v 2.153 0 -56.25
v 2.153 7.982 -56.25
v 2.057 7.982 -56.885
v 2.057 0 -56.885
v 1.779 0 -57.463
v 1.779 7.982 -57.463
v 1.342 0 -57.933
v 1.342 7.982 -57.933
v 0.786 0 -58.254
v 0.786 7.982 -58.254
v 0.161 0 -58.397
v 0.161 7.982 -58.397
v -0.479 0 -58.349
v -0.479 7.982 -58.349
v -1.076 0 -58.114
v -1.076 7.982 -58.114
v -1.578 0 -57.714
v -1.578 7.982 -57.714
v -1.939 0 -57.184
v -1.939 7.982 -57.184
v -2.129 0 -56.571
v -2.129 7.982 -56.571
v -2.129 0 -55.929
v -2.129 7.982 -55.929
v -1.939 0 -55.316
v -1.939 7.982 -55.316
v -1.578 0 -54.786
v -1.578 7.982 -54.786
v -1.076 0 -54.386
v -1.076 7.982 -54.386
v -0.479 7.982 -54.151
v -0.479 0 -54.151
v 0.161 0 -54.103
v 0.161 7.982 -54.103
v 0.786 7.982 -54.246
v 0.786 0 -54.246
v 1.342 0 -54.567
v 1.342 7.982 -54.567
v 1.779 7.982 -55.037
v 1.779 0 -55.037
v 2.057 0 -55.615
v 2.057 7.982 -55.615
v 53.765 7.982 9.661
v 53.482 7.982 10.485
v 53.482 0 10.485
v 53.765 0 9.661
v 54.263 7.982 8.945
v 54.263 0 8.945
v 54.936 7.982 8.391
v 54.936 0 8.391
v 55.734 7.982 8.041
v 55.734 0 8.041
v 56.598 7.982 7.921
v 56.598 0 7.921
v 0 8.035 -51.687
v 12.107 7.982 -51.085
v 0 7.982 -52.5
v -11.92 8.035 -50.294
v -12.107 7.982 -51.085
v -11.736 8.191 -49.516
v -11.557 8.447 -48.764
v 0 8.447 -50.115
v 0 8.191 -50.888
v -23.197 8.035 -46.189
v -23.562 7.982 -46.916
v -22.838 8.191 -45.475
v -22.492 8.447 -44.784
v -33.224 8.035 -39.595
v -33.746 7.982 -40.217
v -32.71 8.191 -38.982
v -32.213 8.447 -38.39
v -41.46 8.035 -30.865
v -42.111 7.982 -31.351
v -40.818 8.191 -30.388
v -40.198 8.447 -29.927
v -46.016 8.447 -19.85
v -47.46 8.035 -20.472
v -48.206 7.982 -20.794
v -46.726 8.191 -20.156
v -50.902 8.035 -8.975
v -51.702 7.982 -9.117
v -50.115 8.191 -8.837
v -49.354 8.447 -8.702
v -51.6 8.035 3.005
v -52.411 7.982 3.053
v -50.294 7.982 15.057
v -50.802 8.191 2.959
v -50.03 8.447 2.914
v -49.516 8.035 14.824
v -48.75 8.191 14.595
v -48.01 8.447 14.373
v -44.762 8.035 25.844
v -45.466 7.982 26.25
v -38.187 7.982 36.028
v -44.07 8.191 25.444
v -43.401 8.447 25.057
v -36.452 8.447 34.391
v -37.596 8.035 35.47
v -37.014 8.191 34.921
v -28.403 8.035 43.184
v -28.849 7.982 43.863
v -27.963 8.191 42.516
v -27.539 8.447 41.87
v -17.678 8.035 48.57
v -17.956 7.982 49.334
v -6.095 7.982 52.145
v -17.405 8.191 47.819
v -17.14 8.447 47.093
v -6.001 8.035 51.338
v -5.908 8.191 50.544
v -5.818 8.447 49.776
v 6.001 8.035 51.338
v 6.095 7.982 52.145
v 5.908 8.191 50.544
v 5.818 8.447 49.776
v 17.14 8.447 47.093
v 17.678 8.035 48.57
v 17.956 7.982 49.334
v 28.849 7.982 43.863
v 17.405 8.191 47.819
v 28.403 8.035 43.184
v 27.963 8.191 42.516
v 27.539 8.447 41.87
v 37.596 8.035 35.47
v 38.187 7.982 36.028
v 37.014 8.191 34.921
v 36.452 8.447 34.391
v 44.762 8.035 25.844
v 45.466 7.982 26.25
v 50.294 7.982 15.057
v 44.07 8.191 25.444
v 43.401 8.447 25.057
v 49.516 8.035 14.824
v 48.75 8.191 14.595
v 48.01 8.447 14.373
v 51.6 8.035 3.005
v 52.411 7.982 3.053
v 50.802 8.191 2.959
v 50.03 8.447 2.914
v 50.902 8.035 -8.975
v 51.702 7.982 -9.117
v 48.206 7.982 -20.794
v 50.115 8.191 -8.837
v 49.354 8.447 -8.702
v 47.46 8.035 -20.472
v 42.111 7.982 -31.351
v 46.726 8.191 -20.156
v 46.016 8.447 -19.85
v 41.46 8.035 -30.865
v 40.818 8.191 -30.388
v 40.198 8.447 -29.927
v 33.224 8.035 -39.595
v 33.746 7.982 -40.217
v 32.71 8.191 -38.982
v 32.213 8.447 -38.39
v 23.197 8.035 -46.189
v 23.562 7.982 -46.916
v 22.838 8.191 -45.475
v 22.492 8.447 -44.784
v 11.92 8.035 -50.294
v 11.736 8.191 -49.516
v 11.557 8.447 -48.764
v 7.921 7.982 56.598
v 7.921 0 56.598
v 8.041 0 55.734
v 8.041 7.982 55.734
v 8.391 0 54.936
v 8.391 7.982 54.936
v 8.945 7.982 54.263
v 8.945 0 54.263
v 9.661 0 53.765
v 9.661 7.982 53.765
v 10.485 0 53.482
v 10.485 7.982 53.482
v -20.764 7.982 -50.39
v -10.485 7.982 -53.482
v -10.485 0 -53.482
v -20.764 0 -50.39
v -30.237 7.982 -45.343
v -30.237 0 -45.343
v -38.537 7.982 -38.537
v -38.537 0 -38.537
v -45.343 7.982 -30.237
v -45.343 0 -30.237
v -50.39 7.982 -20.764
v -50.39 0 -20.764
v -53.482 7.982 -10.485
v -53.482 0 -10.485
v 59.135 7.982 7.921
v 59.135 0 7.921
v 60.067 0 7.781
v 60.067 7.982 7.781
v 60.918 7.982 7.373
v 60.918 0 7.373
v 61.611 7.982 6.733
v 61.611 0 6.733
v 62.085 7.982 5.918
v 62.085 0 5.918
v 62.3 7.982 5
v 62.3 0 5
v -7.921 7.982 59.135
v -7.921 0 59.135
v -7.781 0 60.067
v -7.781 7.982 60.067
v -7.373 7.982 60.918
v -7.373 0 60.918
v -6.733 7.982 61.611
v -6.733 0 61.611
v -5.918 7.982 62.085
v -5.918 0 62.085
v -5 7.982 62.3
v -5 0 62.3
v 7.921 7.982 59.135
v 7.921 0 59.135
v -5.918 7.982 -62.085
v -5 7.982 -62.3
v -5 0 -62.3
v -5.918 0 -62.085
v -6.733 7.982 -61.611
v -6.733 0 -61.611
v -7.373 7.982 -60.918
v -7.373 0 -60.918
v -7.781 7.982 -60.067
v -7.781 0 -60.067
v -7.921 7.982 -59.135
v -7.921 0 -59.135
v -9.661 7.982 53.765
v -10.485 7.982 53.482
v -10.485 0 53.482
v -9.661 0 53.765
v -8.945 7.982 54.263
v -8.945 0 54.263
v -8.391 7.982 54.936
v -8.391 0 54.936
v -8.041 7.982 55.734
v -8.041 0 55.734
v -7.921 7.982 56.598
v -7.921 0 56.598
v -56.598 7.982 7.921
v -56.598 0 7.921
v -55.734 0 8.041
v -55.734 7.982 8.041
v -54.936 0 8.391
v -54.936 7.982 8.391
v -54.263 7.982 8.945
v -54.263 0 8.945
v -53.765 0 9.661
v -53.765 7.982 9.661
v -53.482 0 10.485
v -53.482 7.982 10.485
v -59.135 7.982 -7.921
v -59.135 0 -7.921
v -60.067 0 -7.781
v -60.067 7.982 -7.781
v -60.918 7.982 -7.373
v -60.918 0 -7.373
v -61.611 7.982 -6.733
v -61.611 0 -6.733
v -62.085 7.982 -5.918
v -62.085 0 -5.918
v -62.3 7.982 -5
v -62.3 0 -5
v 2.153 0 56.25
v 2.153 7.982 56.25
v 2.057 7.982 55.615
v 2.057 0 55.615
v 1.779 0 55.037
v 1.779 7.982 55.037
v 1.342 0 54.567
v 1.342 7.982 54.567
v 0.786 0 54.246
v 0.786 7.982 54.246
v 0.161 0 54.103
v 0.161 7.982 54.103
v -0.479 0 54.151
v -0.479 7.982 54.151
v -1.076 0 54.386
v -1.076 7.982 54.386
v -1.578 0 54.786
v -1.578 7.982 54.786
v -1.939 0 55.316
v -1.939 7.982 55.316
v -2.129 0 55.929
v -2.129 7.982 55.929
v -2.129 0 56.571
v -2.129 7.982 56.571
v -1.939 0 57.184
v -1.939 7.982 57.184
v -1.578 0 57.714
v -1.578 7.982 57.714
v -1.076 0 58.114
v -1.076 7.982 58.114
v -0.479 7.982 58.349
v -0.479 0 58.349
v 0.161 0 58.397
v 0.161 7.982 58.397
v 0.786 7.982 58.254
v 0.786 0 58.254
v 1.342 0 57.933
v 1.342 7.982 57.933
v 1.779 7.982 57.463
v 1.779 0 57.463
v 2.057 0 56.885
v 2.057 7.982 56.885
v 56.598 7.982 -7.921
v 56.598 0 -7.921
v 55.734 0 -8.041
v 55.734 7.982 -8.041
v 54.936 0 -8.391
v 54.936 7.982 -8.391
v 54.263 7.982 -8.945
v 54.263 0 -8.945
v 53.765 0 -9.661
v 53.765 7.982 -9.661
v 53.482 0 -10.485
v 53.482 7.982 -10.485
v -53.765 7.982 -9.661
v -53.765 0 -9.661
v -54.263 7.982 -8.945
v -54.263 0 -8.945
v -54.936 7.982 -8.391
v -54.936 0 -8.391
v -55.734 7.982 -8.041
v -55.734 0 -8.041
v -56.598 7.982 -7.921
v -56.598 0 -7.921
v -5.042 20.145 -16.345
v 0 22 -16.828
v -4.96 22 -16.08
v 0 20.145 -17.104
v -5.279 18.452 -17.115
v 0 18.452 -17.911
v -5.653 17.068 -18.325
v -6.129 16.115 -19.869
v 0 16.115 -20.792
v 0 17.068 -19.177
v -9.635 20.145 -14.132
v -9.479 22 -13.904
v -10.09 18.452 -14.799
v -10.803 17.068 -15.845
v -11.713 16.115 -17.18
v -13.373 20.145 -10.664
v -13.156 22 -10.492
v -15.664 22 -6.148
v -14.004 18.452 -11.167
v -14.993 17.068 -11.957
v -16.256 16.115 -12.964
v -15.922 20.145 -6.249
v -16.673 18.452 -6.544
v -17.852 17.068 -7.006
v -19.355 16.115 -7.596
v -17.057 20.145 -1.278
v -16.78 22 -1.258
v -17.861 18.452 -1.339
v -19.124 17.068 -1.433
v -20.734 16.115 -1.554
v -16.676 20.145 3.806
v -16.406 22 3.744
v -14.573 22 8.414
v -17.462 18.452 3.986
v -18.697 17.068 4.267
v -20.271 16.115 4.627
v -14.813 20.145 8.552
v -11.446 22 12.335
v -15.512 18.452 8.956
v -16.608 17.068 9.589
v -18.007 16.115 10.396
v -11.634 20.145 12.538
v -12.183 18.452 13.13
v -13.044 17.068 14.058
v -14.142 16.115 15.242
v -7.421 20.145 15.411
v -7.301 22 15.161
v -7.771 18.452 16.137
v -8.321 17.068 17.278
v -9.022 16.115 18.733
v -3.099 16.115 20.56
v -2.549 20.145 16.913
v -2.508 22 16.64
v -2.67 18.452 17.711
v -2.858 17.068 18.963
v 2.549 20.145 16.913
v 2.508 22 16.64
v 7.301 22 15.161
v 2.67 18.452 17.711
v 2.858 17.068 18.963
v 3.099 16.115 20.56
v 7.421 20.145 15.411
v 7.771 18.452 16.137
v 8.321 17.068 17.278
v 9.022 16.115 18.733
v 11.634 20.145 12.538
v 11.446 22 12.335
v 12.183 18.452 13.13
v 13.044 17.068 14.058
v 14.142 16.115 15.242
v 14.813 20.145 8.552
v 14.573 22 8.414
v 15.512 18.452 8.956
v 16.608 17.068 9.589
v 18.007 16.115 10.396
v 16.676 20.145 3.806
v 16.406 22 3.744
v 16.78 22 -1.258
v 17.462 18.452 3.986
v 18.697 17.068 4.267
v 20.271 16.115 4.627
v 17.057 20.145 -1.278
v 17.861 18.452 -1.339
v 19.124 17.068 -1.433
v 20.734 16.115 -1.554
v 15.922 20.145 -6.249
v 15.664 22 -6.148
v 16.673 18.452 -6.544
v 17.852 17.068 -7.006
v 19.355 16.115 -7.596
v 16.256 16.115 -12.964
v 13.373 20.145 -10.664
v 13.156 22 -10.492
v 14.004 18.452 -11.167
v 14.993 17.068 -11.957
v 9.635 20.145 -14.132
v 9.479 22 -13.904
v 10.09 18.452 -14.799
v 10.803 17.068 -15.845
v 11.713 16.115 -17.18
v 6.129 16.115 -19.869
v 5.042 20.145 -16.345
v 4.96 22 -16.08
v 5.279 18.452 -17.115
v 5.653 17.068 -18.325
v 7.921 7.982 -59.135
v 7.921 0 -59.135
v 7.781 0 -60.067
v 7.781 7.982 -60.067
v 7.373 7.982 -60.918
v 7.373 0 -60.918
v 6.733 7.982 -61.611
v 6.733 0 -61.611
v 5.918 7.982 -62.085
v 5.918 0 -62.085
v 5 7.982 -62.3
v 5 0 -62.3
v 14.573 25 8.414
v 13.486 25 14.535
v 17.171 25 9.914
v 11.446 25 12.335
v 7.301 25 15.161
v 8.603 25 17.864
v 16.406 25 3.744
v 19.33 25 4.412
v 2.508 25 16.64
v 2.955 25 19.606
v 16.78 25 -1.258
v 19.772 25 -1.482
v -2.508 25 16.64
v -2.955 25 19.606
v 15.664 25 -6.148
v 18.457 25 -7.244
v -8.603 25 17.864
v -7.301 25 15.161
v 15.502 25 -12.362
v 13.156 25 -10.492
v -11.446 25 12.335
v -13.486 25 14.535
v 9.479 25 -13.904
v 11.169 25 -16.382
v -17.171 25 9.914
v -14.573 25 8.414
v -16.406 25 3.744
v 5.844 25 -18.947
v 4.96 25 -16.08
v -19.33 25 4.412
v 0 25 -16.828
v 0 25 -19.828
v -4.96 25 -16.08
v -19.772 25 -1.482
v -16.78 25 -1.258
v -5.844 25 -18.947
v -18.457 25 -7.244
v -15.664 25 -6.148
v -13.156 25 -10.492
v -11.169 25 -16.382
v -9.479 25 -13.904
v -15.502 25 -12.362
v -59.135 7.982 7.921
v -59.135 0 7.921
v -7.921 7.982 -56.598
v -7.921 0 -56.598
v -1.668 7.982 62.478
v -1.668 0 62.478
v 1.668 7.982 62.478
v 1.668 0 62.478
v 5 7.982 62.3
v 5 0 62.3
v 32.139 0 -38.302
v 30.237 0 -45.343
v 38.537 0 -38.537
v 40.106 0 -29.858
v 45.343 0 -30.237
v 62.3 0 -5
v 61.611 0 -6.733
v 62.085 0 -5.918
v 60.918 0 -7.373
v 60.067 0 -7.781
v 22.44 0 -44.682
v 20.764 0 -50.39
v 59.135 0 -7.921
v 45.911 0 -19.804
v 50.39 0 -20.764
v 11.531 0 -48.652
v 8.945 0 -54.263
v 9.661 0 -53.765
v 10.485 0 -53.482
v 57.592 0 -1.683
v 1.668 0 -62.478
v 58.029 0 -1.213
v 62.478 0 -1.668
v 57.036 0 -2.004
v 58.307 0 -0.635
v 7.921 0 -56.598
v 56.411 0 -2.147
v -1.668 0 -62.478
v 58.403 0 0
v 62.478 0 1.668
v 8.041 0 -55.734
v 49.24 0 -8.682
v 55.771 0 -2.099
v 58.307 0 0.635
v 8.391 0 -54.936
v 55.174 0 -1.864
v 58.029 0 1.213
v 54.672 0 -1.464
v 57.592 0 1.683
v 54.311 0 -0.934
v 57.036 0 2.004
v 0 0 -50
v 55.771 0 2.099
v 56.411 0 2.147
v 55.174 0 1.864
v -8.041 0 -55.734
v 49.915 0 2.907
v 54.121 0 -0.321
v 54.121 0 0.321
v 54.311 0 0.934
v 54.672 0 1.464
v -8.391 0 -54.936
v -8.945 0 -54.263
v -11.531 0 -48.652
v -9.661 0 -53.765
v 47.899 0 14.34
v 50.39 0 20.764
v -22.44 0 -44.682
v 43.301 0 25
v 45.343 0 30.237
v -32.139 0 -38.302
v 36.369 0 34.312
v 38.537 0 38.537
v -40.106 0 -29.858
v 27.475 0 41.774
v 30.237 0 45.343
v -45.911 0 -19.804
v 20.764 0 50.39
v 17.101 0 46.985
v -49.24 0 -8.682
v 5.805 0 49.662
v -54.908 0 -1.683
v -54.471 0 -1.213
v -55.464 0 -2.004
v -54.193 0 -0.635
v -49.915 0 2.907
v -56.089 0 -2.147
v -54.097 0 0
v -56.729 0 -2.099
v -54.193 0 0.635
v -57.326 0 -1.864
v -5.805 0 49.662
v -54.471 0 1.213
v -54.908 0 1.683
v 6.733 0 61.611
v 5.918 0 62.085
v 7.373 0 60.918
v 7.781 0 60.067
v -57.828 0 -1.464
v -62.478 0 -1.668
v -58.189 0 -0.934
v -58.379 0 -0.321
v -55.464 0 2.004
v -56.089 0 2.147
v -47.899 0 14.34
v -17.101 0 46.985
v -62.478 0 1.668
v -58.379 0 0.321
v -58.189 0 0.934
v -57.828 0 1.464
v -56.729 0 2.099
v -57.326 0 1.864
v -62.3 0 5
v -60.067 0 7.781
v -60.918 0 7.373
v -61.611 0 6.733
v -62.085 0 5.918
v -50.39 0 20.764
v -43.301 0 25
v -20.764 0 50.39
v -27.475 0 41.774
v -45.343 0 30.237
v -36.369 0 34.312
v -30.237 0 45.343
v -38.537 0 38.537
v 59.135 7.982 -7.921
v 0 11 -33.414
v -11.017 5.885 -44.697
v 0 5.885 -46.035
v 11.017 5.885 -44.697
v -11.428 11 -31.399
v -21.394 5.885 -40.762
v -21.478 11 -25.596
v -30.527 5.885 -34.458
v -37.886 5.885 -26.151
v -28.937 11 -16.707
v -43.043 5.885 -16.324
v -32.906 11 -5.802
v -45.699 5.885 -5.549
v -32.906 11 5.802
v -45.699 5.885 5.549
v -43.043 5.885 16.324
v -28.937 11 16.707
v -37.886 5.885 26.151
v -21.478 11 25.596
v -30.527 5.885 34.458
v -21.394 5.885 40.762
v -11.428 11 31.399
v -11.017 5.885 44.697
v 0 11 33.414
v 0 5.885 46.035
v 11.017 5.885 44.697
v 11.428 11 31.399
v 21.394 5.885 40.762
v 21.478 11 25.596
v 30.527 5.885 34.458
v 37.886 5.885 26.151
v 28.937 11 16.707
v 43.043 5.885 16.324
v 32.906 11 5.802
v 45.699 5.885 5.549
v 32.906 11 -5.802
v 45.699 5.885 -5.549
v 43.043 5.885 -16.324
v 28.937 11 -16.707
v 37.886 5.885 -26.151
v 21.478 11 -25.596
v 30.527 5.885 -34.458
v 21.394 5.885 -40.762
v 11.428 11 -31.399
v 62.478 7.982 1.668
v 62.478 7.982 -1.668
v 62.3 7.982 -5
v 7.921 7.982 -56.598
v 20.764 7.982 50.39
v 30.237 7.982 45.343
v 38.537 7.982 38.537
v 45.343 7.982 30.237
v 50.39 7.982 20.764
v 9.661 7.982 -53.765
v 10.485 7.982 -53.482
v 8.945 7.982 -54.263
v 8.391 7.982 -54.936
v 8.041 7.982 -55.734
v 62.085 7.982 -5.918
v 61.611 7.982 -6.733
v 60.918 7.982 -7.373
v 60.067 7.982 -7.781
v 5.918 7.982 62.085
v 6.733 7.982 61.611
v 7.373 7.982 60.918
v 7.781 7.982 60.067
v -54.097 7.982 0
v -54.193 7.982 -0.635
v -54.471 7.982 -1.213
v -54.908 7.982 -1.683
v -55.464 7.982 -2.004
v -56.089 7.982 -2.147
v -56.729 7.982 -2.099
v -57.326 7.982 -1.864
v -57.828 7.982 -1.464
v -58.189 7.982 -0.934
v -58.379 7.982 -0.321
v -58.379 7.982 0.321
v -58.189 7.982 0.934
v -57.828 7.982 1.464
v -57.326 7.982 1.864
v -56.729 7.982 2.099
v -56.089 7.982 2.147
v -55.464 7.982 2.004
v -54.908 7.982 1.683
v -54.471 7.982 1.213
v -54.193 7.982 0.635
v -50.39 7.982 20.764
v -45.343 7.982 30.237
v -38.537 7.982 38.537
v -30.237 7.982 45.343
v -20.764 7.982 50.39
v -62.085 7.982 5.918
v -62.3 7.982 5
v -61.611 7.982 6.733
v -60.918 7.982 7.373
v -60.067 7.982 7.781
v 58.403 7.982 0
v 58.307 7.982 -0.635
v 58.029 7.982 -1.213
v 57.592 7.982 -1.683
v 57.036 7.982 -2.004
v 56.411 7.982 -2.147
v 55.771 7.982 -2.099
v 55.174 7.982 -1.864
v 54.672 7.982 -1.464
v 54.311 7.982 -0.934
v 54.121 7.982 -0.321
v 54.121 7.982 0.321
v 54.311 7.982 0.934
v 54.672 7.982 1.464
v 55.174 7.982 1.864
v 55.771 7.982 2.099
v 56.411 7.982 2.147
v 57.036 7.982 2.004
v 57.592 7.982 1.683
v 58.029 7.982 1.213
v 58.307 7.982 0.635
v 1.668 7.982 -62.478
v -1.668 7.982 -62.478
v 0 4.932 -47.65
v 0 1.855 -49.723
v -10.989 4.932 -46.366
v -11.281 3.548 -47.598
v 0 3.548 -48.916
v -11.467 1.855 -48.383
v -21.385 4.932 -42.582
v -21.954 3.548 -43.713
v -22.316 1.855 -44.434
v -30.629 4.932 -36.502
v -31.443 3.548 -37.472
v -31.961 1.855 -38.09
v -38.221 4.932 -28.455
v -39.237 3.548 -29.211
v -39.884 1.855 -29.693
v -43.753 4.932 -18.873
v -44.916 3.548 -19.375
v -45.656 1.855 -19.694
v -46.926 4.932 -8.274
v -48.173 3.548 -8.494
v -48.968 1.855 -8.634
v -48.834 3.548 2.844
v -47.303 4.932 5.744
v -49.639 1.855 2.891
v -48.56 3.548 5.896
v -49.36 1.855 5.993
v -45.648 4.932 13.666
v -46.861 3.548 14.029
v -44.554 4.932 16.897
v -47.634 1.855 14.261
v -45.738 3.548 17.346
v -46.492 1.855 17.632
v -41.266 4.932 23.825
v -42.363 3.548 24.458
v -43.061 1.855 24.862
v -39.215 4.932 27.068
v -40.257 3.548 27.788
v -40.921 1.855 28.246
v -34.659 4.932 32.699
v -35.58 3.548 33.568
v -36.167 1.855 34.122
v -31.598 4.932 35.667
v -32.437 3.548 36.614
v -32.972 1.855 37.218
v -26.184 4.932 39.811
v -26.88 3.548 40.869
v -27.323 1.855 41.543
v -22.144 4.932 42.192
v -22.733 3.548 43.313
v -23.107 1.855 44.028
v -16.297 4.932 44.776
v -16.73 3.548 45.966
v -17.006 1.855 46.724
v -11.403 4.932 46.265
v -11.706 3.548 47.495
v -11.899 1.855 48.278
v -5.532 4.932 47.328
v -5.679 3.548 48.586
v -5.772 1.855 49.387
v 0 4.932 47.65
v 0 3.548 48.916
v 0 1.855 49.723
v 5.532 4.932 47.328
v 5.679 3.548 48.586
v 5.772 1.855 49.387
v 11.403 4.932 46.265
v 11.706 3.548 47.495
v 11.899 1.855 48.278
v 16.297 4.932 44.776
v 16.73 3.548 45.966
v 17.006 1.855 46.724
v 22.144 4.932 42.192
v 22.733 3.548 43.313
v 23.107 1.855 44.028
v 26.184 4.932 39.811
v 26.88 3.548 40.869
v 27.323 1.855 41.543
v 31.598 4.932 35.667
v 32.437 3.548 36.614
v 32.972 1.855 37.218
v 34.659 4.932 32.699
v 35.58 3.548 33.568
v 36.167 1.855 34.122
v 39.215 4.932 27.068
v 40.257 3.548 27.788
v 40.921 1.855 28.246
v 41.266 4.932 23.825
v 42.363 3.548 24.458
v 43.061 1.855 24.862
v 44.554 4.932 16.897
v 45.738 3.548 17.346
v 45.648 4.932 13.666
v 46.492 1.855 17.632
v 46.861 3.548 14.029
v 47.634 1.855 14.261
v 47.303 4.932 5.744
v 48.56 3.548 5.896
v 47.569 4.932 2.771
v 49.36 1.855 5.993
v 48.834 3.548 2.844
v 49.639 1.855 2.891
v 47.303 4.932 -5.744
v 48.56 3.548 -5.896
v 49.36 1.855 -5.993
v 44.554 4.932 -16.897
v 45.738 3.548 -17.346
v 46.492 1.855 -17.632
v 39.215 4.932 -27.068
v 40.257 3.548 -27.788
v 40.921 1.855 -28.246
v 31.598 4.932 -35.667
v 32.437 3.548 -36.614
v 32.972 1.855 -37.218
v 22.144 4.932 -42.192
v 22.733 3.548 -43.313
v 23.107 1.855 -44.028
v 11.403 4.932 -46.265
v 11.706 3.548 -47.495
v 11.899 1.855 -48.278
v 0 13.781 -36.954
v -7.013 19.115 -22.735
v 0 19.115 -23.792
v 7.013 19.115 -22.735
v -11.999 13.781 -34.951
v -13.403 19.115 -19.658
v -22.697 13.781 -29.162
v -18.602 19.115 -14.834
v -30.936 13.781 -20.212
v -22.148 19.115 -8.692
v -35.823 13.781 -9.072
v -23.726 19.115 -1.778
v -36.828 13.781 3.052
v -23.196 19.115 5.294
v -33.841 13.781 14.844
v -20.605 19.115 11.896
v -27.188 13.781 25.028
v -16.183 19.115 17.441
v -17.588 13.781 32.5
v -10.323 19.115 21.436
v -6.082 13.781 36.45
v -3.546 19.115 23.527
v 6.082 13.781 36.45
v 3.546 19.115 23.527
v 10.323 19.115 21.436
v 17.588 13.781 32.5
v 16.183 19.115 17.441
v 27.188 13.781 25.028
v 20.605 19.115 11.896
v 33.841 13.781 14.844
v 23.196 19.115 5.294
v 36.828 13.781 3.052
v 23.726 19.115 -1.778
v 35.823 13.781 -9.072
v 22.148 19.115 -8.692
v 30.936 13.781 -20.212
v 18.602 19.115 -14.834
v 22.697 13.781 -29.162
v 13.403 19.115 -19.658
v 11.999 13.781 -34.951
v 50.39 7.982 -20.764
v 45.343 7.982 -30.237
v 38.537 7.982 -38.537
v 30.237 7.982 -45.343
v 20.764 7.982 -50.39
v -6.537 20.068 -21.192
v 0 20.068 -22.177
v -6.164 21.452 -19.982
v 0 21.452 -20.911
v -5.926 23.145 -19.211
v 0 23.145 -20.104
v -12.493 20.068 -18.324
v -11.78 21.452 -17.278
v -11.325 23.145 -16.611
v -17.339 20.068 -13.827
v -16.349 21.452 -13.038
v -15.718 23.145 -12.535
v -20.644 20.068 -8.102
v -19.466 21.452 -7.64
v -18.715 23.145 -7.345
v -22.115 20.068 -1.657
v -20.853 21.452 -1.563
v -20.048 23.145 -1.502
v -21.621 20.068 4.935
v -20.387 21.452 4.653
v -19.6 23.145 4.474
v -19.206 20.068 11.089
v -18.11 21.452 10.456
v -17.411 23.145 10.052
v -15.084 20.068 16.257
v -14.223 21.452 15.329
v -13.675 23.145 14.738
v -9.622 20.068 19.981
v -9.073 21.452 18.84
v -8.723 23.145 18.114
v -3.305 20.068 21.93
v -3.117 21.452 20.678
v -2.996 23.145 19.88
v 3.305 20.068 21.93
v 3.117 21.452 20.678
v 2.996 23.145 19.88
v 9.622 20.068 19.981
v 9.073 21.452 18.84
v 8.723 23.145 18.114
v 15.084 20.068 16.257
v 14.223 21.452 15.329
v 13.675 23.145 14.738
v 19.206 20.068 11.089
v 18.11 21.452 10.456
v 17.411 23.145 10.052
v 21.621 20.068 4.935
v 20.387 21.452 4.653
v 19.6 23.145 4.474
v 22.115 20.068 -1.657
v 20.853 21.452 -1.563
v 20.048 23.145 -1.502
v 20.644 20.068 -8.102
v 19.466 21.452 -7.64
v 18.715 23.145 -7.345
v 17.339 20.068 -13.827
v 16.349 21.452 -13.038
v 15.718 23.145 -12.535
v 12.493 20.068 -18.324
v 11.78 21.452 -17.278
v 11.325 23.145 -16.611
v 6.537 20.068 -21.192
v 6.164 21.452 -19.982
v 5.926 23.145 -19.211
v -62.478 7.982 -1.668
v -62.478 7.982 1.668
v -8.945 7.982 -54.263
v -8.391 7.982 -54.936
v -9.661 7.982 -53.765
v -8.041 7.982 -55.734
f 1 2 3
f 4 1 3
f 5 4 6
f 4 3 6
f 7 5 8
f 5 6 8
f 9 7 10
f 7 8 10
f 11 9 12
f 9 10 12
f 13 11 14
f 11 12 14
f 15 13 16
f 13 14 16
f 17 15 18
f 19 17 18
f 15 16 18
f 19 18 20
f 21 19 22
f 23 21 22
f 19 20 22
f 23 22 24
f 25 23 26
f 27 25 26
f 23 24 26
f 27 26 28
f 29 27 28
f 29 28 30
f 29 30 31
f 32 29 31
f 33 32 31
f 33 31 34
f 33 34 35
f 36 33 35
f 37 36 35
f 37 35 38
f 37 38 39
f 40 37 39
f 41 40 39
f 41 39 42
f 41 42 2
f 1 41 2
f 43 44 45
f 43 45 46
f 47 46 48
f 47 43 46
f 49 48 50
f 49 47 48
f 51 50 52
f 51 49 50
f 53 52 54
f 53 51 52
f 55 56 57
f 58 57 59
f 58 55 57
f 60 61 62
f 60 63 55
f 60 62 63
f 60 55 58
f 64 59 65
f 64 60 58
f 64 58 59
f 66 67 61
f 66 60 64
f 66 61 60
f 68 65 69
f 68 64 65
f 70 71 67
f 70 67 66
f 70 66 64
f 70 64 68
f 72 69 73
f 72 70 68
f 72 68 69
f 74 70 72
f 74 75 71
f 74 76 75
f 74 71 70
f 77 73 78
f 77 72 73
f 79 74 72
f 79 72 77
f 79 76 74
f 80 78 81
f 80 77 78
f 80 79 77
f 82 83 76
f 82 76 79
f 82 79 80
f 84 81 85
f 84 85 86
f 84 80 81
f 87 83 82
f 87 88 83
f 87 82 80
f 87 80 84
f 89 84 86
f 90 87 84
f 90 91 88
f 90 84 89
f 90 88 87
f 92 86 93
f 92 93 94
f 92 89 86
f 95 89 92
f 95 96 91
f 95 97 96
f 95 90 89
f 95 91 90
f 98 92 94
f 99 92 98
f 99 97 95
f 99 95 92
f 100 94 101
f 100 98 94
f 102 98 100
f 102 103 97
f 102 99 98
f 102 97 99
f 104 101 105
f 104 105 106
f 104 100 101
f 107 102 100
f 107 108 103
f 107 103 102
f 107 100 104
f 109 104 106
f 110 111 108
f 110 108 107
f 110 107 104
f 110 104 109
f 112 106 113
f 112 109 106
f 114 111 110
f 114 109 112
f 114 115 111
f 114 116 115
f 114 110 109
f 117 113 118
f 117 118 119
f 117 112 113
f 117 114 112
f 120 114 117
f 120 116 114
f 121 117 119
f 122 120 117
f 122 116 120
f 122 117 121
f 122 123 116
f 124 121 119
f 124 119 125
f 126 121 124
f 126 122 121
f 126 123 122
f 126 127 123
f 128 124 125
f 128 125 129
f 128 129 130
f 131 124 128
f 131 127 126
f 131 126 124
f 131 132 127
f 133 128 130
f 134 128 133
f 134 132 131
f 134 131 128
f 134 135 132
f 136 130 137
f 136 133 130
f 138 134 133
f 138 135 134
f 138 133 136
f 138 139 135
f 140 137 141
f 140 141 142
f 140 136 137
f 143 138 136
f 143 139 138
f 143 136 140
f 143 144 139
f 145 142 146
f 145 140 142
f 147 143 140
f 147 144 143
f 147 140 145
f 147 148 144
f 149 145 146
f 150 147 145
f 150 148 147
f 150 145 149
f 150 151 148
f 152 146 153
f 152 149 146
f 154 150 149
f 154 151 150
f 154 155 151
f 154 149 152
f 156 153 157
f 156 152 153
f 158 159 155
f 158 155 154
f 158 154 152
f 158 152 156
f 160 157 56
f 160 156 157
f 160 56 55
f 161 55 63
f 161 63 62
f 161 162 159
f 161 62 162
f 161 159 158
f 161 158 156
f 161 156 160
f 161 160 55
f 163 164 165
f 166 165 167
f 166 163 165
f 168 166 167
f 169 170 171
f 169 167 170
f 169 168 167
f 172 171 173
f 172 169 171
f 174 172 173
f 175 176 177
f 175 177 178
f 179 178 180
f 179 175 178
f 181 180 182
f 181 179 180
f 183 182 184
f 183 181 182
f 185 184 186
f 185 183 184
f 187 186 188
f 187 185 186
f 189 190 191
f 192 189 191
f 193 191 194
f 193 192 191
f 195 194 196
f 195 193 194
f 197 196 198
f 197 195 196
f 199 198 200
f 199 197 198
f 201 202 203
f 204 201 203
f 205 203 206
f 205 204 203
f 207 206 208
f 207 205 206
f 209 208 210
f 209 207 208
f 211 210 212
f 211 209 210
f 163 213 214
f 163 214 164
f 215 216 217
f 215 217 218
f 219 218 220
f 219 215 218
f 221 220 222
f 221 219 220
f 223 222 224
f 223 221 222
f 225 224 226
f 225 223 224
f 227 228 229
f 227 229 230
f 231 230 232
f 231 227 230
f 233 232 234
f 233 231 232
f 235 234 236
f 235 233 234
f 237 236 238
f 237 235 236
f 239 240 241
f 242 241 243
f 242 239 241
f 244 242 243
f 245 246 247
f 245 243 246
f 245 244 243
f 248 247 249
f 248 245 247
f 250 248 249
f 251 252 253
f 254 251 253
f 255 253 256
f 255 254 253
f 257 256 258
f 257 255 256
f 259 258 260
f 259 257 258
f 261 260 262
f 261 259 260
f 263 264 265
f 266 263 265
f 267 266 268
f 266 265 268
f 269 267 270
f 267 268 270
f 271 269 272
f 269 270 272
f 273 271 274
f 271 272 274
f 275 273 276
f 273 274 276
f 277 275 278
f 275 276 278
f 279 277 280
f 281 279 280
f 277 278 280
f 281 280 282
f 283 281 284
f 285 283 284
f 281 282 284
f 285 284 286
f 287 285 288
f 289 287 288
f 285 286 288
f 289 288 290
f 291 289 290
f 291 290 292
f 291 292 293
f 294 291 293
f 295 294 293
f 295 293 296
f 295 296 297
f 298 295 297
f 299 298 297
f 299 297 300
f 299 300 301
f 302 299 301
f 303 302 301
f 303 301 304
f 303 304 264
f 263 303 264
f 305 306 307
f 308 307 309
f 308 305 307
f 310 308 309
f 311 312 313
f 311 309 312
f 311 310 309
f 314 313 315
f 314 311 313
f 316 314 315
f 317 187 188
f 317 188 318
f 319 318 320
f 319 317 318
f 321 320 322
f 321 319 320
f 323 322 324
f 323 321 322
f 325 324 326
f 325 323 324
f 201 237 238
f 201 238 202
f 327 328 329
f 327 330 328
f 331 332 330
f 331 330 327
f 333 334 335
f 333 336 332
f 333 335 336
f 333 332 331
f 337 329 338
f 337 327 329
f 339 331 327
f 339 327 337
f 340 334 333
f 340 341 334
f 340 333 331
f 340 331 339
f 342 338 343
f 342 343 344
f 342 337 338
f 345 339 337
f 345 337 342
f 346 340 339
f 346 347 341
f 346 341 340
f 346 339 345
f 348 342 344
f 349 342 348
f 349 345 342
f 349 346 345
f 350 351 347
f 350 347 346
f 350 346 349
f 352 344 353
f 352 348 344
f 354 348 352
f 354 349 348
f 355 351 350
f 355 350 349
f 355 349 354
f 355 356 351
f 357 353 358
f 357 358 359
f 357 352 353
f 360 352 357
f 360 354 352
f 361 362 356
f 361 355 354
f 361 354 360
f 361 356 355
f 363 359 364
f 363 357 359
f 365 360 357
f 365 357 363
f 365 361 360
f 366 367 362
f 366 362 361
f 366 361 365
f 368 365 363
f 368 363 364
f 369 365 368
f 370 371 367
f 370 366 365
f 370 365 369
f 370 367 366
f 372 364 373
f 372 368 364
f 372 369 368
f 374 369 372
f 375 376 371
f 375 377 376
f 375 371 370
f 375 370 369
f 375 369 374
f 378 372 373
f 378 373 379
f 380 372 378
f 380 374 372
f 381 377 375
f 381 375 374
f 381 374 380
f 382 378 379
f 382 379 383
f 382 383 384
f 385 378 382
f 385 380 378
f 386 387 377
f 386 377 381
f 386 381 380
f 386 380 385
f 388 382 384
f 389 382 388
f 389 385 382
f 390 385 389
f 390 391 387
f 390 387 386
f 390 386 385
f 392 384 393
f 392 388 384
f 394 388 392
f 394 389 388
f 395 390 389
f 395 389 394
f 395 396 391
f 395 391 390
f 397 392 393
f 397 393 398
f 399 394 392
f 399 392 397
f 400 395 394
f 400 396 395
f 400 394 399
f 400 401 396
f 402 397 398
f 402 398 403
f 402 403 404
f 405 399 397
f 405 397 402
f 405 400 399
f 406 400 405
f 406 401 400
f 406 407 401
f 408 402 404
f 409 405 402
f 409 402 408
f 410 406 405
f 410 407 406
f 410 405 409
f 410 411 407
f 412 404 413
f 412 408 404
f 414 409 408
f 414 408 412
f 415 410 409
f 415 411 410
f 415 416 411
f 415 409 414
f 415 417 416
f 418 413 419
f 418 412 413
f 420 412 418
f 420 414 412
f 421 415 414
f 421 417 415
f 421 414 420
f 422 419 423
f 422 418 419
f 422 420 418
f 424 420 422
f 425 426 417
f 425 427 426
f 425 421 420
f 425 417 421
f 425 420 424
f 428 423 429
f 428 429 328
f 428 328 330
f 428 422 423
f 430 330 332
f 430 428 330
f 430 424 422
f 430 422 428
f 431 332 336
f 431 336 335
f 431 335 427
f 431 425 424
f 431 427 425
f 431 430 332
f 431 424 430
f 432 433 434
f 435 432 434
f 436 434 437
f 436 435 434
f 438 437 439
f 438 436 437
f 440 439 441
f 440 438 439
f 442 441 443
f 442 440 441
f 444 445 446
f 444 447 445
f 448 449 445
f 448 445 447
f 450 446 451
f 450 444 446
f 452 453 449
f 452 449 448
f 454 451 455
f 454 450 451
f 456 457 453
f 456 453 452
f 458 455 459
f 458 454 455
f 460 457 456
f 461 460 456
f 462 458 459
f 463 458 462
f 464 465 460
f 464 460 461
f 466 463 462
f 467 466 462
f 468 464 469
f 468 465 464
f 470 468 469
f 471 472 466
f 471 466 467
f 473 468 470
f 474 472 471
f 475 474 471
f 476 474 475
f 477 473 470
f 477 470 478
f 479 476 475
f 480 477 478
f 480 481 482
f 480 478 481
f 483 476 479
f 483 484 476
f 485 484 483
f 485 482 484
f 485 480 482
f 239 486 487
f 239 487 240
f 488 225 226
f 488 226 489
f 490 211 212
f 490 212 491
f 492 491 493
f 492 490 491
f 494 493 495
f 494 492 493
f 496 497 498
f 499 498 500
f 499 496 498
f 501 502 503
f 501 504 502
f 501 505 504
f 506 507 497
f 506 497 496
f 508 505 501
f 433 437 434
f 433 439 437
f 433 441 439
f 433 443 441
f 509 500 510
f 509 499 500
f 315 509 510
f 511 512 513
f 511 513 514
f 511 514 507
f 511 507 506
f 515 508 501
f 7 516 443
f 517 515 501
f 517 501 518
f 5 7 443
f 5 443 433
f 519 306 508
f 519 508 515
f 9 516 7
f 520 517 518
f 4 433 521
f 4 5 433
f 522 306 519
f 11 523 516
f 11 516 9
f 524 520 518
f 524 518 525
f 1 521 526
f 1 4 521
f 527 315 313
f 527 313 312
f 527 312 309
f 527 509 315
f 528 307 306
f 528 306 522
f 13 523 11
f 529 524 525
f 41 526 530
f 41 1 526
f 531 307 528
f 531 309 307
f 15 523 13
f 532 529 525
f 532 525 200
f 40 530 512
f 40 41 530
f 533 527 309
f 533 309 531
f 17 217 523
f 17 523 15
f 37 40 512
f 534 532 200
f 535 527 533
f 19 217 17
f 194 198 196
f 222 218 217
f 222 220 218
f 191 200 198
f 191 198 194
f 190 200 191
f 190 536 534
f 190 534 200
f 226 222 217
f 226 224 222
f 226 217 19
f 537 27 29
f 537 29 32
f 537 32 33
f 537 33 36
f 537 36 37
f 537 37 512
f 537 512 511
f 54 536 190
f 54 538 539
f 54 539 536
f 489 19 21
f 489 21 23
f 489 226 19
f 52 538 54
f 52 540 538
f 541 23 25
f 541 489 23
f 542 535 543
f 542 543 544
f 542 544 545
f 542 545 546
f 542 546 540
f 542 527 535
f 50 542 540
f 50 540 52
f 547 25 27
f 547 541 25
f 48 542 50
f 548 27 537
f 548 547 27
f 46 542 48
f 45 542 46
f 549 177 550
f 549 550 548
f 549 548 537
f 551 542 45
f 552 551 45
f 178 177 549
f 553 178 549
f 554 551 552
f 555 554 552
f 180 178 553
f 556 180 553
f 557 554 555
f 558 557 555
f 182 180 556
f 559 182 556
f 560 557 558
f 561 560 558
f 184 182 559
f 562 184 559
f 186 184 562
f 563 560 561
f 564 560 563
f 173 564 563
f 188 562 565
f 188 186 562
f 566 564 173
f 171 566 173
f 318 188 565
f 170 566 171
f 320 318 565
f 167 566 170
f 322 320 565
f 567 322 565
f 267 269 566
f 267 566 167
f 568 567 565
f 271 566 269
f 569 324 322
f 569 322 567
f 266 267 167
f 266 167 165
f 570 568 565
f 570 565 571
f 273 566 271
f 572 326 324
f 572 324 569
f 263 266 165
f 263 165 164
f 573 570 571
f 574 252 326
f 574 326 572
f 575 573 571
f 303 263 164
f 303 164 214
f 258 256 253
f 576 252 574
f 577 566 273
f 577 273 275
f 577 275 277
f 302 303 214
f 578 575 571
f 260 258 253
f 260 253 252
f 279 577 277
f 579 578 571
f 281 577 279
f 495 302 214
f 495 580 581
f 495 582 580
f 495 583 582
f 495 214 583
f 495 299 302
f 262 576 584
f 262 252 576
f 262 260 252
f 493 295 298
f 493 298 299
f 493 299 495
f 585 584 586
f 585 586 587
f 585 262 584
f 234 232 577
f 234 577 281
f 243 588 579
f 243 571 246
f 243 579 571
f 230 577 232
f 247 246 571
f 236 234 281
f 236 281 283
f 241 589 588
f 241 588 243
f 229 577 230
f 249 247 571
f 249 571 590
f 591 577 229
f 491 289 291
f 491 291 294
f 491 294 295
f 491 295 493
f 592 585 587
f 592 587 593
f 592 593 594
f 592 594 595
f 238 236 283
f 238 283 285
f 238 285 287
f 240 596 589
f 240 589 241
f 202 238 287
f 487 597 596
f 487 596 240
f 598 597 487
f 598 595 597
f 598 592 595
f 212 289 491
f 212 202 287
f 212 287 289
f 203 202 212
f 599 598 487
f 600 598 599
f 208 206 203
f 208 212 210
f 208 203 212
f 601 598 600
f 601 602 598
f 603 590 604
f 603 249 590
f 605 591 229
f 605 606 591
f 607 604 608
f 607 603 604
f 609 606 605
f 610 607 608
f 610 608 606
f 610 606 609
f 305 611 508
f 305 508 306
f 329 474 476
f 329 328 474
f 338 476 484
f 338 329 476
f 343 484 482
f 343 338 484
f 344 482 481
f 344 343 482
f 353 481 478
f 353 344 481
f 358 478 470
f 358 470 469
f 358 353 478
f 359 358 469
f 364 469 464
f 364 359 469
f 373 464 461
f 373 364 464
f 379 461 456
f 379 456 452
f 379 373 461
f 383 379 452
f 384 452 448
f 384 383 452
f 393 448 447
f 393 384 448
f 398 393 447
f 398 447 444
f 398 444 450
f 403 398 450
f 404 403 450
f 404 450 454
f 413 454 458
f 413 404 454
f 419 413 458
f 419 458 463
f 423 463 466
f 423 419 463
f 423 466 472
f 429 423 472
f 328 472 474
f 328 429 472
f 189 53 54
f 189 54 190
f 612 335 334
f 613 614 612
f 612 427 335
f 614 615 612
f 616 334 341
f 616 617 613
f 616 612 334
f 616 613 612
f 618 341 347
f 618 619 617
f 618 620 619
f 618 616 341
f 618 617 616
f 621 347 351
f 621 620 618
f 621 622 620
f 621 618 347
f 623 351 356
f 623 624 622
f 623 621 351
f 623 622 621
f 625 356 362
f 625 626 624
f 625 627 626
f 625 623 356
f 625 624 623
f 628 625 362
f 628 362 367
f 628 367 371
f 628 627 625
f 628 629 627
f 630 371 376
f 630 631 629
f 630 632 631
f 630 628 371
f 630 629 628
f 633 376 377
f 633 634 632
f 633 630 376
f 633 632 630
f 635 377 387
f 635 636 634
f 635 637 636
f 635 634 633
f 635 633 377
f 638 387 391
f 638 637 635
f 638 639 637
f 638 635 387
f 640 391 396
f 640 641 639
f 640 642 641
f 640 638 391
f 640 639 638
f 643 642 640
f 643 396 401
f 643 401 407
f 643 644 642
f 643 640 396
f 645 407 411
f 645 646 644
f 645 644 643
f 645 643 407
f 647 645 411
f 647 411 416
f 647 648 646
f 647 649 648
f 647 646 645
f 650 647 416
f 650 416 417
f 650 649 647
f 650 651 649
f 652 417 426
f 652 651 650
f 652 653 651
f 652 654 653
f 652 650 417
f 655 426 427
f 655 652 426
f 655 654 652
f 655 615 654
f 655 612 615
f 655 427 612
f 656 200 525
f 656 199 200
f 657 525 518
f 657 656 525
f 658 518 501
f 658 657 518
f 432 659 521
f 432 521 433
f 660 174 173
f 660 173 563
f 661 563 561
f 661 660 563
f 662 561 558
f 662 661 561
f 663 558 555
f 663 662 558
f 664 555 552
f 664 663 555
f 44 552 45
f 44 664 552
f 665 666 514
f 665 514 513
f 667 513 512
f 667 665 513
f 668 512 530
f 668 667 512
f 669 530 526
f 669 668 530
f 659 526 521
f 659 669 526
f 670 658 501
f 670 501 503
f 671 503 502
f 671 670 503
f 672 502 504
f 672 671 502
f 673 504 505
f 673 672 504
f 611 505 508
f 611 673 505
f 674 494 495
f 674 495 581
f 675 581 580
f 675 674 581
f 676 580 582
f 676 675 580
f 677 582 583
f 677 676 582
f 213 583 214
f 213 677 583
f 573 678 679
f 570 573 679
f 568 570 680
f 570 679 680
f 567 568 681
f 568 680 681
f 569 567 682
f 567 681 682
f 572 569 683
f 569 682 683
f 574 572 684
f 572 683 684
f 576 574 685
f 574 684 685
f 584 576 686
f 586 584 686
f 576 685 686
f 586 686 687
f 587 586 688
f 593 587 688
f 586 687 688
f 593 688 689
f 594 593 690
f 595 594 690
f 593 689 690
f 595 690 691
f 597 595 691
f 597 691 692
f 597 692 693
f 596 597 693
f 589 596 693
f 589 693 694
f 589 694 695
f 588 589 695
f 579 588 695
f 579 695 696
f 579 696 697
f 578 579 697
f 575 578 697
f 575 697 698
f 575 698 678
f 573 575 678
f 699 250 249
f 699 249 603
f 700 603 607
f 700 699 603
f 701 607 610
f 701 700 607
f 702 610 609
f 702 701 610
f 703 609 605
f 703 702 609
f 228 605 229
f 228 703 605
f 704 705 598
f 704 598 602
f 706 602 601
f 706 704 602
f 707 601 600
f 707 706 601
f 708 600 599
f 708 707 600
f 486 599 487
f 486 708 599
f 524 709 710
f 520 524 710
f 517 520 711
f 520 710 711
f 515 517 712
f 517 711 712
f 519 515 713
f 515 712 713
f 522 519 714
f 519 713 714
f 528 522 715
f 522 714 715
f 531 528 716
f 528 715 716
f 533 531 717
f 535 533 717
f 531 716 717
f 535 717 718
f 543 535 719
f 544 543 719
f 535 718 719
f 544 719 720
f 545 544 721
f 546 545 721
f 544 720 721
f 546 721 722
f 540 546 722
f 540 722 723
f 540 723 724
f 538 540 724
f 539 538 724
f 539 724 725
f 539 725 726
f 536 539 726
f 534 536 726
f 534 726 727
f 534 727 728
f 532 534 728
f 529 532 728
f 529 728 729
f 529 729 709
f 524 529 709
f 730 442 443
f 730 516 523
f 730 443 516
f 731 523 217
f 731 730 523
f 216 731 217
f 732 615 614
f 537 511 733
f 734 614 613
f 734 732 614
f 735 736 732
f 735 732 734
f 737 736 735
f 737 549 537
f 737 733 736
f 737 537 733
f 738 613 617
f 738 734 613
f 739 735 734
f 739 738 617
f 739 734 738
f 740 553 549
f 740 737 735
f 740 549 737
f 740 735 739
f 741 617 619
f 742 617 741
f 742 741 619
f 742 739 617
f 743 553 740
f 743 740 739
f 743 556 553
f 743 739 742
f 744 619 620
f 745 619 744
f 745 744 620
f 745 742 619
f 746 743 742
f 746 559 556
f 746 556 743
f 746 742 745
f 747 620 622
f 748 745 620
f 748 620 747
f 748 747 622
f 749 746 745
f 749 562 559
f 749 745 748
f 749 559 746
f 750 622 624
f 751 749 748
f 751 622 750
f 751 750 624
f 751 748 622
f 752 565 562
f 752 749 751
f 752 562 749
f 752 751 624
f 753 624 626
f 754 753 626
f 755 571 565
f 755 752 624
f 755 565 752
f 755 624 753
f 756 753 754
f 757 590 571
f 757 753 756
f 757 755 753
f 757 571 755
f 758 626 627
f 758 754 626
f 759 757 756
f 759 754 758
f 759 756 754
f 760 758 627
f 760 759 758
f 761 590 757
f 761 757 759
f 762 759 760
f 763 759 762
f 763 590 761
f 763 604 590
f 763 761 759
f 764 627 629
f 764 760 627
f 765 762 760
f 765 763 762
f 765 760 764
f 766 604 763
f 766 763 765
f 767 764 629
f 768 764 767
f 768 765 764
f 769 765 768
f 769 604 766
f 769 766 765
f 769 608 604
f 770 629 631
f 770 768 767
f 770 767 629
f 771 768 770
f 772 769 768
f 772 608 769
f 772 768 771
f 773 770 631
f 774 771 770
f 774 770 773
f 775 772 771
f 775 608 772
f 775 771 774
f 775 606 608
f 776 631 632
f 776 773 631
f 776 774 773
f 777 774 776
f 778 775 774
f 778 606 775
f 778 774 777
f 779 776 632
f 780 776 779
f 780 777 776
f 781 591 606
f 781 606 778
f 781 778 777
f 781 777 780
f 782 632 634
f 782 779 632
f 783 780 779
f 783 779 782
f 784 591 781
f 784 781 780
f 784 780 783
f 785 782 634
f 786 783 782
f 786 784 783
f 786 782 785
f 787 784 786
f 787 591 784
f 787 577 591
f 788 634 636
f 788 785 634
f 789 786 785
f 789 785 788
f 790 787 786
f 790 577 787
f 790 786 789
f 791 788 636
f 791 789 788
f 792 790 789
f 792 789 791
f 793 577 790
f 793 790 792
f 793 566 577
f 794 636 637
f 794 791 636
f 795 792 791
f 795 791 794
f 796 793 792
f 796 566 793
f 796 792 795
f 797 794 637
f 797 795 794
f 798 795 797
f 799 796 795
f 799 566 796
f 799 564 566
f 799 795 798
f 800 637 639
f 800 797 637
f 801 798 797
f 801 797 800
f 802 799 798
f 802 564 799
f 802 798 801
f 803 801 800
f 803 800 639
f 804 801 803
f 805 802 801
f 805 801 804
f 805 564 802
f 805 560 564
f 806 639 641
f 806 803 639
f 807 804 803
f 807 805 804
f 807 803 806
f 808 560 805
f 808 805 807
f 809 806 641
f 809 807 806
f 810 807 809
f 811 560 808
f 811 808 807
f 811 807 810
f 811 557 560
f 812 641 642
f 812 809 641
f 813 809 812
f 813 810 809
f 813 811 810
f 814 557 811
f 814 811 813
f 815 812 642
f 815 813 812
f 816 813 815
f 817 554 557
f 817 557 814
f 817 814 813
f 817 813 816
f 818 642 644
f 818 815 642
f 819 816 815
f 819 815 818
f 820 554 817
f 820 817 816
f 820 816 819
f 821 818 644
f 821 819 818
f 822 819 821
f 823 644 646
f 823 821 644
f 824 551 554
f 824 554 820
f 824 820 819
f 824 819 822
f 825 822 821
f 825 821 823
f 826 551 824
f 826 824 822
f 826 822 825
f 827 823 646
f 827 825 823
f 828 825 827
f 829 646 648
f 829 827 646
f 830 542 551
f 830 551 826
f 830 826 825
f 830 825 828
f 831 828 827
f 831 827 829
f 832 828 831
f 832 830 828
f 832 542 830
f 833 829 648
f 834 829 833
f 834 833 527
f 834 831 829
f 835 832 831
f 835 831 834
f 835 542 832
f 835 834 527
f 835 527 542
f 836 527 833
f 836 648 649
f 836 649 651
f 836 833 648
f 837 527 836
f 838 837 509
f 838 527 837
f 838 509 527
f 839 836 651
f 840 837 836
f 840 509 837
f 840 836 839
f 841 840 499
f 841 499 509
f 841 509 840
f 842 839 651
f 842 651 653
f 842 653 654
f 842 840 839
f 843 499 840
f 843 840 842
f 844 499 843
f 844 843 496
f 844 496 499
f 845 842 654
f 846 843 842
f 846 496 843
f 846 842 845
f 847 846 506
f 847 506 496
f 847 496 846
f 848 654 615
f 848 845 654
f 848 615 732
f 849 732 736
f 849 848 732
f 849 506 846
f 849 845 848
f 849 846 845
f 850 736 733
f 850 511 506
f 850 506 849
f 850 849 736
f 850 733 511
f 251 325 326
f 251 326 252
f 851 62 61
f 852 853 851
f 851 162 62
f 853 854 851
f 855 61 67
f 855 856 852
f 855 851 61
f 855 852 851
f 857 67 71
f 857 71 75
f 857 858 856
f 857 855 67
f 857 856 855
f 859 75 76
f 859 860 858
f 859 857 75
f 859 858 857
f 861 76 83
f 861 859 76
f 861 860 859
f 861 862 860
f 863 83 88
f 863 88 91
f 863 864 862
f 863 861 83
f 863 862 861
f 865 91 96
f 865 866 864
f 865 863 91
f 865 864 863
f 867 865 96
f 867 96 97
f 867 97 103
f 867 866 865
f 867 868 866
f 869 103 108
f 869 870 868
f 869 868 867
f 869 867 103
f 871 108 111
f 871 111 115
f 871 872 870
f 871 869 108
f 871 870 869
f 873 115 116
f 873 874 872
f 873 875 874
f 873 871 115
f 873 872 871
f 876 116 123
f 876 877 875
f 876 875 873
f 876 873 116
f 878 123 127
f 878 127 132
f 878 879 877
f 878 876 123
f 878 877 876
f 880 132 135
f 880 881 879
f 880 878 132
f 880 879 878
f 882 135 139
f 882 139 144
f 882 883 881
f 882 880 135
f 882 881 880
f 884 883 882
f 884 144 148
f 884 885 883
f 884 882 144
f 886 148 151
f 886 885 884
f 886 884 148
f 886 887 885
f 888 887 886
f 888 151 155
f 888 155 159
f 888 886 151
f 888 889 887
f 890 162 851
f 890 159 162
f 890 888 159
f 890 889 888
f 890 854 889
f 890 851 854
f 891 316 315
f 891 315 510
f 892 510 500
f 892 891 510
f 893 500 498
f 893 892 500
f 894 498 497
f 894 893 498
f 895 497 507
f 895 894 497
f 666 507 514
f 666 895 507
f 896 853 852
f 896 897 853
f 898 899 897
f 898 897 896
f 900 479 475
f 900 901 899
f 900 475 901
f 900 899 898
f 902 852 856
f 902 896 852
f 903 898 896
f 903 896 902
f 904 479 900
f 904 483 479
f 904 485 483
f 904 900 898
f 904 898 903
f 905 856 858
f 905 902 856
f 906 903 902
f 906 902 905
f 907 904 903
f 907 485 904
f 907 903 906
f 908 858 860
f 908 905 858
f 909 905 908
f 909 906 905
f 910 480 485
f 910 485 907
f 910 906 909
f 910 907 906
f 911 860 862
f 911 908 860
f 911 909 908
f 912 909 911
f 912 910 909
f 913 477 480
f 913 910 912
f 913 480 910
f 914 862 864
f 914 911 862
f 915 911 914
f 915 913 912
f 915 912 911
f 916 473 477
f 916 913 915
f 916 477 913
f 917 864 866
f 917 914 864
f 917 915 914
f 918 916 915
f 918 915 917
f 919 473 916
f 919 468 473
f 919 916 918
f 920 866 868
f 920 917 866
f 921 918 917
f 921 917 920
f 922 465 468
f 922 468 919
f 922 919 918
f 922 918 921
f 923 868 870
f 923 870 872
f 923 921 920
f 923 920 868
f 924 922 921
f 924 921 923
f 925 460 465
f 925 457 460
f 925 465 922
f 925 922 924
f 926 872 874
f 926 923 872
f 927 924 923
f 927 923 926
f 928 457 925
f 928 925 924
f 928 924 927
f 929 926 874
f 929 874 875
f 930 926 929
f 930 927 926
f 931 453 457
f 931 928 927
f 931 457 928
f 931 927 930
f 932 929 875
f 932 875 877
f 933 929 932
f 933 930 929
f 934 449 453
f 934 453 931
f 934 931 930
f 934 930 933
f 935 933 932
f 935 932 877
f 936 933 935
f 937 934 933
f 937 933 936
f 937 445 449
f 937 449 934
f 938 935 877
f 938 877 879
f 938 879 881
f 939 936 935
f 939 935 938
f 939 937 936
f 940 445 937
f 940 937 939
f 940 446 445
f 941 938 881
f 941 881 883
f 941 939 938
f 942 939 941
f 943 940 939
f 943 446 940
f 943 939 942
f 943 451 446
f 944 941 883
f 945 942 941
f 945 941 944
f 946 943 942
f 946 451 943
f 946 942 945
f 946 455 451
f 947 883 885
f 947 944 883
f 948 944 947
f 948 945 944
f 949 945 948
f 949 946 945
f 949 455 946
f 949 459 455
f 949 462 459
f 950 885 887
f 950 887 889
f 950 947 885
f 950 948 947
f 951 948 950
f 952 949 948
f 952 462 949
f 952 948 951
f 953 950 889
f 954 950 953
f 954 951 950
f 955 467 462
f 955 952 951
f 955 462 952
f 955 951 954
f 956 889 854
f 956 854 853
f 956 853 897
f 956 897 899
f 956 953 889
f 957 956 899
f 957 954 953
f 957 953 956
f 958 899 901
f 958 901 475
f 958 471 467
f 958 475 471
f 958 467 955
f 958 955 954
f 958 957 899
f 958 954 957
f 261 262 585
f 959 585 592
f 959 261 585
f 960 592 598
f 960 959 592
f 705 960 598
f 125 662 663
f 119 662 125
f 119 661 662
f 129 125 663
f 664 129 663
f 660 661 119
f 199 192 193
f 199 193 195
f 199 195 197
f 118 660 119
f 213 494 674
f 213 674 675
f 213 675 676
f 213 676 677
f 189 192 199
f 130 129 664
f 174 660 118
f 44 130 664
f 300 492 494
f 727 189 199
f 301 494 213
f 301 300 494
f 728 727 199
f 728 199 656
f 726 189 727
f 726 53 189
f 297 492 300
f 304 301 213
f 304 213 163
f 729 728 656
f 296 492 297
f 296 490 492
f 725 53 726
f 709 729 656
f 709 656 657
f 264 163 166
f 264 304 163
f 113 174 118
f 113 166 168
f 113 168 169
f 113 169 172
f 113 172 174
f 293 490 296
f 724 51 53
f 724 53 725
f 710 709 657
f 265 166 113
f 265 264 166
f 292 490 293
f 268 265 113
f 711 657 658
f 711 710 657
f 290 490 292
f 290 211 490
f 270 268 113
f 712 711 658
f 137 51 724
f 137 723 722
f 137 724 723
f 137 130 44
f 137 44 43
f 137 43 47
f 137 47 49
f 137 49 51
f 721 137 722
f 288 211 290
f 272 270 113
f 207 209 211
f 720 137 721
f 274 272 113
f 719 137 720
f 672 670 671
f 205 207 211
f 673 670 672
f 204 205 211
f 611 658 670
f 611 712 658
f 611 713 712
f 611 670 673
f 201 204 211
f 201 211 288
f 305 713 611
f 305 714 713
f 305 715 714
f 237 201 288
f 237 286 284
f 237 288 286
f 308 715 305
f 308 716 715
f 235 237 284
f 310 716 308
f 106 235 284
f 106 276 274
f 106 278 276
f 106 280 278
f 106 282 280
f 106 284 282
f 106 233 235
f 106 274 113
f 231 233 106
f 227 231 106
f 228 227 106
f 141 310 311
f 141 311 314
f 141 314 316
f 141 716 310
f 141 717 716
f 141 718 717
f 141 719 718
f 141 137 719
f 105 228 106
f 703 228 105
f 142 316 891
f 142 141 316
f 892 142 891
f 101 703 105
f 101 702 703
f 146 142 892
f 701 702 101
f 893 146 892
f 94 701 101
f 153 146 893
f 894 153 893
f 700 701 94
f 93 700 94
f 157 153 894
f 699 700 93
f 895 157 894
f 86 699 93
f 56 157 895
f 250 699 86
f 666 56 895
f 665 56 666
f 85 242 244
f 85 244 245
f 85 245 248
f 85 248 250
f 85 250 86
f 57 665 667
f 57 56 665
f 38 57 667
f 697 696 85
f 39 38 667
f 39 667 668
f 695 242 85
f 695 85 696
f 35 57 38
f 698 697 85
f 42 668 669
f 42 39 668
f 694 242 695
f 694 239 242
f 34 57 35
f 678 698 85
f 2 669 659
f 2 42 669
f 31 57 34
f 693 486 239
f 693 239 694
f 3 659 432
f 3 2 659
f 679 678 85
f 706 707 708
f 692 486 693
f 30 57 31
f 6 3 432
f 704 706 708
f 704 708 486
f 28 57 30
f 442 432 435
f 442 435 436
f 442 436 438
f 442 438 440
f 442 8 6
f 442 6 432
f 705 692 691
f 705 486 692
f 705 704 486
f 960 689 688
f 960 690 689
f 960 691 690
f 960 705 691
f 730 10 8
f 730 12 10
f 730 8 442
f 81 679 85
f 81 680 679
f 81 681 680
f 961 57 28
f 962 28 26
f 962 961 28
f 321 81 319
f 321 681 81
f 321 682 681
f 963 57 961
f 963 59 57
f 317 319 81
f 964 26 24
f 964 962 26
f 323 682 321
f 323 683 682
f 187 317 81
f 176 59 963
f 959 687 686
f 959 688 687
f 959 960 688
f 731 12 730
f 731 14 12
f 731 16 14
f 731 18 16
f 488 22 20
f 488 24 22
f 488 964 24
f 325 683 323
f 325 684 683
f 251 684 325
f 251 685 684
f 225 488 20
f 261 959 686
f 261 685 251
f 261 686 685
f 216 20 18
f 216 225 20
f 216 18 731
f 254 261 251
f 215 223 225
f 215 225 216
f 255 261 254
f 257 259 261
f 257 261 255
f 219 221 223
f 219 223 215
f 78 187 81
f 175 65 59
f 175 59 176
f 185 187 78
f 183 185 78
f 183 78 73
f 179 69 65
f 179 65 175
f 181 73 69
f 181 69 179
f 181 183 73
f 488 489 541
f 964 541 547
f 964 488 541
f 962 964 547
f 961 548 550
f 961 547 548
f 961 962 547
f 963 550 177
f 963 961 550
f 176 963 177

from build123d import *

# Parameters (mm, degrees)
F_18_0_1695_DIAMETER_HOLE1_D     = 4.3053
F_18_0_1695_DIAMETER_HOLE1_DEPTH = 38.1
F_18_0_1695_DIAMETER_HOLE1_TIP   = 1.293442612
CUT_EXTRUDE1_DEPTH               = 28


with BuildPart() as part:
    # Sketch2 → Revolve1 (revolve)
    with BuildSketch(Plane.XY, mode=Mode.PRIVATE) as revolve1_sk:
        with BuildLine():
            Line((50, 0), (62.5, 0))
            Line((62.5, 0), (62.5, 7.982495649))
            Line((62.5, 7.982495649), (52.5, 7.982495649))
            ThreePointArc((52.5, 7.982495649), (51.285053929, 8.09980714), (50.114998295, 8.447407131))
            Line((50.114998295, 8.447407131), (23.792498295, 19.114911482))
            ThreePointArc((23.792498295, 19.114911482), (20.911227085, 21.451920296), (19.8275, 25))
            Line((19.8275, 25), (16.8275, 25))
            Line((16.8275, 25), (16.8275, 22))
            ThreePointArc((16.8275, 22), (17.911227085, 18.451920296), (20.792498295, 16.114911482))
            Line((20.792498295, 16.114911482), (46.035001705, 5.885088518))
            ThreePointArc((46.035001705, 5.885088518), (48.916272915, 3.548079704), (50, 0))
        make_face()
    revolve(revolve1_sk.sketch.rotate(Axis((0, 0, 0), (0, 1, 0)), 90), axis=Axis((0, 0, 0), (0, 1, 0)))

    # #18 (0.1695) Diameter Hole1
    with Locations(Plane(origin=(0, 0, 0), x_dir=(-1, 0, 0), z_dir=(0, -1, 0))):
        with Locations((0, 56.25), (0, -56.25), (-56.25, 0), (56.25, 0)):
            Hole(F_18_0_1695_DIAMETER_HOLE1_D / 2, depth=F_18_0_1695_DIAMETER_HOLE1_DEPTH)
            with Locations((0, 0, -(F_18_0_1695_DIAMETER_HOLE1_DEPTH + F_18_0_1695_DIAMETER_HOLE1_TIP / 2))):  # 118° drill point
                Cone(0, F_18_0_1695_DIAMETER_HOLE1_D / 2, F_18_0_1695_DIAMETER_HOLE1_TIP, mode=Mode.SUBTRACT)

    # Sketch5 → Cut-Extrude1 (cut)
    with BuildSketch(Plane(origin=(0, 7.982495649, 0), x_dir=(1, 0, 0), z_dir=(0, 1, 0))):
        with BuildLine():
            Line((-56.597565166, 7.921), (-59.13485528, 7.921))
            ThreePointArc((-59.13485528, 7.921), (-61.28824505, 7.07913898), (-62.299678972, 5))
            ThreePointArc((-62.299678972, 5), (-44.194173824, 44.194173824), (-5, 62.299678972))
            ThreePointArc((-5, 62.299678972), (-7.07913898, 61.28824505), (-7.921, 59.13485528))
            Line((-7.921, 59.13485528), (-7.921, 56.597565166))
            ThreePointArc((-7.921, 56.597565166), (-8.644467885, 54.57998881), (-10.485166883, 53.48187801))
            ThreePointArc((-10.485166883, 53.48187801), (-38.537319575, 38.537319575), (-53.48187801, 10.485166883))
            ThreePointArc((-53.48187801, 10.485166883), (-54.57998881, 8.644467885), (-56.597565166, 7.921))
        make_face()
        with BuildLine():
            Line((7.921, 56.597565166), (7.921, 59.13485528))
            ThreePointArc((7.921, 59.13485528), (7.07913898, 61.28824505), (5, 62.299678972))
            ThreePointArc((5, 62.299678972), (44.194173824, 44.194173824), (62.299678972, 5))
            ThreePointArc((62.299678972, 5), (61.28824505, 7.07913898), (59.13485528, 7.921))
            Line((59.13485528, 7.921), (56.597565166, 7.921))
            ThreePointArc((56.597565166, 7.921), (54.57998881, 8.644467885), (53.48187801, 10.485166883))
            ThreePointArc((53.48187801, 10.485166883), (38.537319575, 38.537319575), (10.485166883, 53.48187801))
            ThreePointArc((10.485166883, 53.48187801), (8.644467885, 54.57998881), (7.921, 56.597565166))
        make_face()
        with BuildLine():
            Line((56.597565166, -7.921), (59.13485528, -7.921))
            ThreePointArc((59.13485528, -7.921), (61.28824505, -7.07913898), (62.299678972, -5))
            ThreePointArc((62.299678972, -5), (44.194173824, -44.194173824), (5, -62.299678972))
            ThreePointArc((5, -62.299678972), (7.07913898, -61.28824505), (7.921, -59.13485528))
            Line((7.921, -59.13485528), (7.921, -56.597565166))
            ThreePointArc((7.921, -56.597565166), (8.644467885, -54.57998881), (10.485166883, -53.48187801))
            ThreePointArc((10.485166883, -53.48187801), (38.537319575, -38.537319575), (53.48187801, -10.485166883))
            ThreePointArc((53.48187801, -10.485166883), (54.57998881, -8.644467885), (56.597565166, -7.921))
        make_face()
        with BuildLine():
            Line((-7.921, -56.597565166), (-7.921, -59.13485528))
            ThreePointArc((-7.921, -59.13485528), (-7.07913898, -61.28824505), (-5, -62.299678972))
            ThreePointArc((-5, -62.299678972), (-44.194173824, -44.194173824), (-62.299678972, -5))
            ThreePointArc((-62.299678972, -5), (-61.28824505, -7.07913898), (-59.13485528, -7.921))
            Line((-59.13485528, -7.921), (-56.597565166, -7.921))
            ThreePointArc((-56.597565166, -7.921), (-54.57998881, -8.644467885), (-53.48187801, -10.485166883))
            ThreePointArc((-53.48187801, -10.485166883), (-38.537319575, -38.537319575), (-10.485166883, -53.48187801))
            ThreePointArc((-10.485166883, -53.48187801), (-8.644467885, -54.57998881), (-7.921, -56.597565166))
        make_face()
    extrude(amount=-CUT_EXTRUDE1_DEPTH, mode=Mode.SUBTRACT)


solid = part.part
